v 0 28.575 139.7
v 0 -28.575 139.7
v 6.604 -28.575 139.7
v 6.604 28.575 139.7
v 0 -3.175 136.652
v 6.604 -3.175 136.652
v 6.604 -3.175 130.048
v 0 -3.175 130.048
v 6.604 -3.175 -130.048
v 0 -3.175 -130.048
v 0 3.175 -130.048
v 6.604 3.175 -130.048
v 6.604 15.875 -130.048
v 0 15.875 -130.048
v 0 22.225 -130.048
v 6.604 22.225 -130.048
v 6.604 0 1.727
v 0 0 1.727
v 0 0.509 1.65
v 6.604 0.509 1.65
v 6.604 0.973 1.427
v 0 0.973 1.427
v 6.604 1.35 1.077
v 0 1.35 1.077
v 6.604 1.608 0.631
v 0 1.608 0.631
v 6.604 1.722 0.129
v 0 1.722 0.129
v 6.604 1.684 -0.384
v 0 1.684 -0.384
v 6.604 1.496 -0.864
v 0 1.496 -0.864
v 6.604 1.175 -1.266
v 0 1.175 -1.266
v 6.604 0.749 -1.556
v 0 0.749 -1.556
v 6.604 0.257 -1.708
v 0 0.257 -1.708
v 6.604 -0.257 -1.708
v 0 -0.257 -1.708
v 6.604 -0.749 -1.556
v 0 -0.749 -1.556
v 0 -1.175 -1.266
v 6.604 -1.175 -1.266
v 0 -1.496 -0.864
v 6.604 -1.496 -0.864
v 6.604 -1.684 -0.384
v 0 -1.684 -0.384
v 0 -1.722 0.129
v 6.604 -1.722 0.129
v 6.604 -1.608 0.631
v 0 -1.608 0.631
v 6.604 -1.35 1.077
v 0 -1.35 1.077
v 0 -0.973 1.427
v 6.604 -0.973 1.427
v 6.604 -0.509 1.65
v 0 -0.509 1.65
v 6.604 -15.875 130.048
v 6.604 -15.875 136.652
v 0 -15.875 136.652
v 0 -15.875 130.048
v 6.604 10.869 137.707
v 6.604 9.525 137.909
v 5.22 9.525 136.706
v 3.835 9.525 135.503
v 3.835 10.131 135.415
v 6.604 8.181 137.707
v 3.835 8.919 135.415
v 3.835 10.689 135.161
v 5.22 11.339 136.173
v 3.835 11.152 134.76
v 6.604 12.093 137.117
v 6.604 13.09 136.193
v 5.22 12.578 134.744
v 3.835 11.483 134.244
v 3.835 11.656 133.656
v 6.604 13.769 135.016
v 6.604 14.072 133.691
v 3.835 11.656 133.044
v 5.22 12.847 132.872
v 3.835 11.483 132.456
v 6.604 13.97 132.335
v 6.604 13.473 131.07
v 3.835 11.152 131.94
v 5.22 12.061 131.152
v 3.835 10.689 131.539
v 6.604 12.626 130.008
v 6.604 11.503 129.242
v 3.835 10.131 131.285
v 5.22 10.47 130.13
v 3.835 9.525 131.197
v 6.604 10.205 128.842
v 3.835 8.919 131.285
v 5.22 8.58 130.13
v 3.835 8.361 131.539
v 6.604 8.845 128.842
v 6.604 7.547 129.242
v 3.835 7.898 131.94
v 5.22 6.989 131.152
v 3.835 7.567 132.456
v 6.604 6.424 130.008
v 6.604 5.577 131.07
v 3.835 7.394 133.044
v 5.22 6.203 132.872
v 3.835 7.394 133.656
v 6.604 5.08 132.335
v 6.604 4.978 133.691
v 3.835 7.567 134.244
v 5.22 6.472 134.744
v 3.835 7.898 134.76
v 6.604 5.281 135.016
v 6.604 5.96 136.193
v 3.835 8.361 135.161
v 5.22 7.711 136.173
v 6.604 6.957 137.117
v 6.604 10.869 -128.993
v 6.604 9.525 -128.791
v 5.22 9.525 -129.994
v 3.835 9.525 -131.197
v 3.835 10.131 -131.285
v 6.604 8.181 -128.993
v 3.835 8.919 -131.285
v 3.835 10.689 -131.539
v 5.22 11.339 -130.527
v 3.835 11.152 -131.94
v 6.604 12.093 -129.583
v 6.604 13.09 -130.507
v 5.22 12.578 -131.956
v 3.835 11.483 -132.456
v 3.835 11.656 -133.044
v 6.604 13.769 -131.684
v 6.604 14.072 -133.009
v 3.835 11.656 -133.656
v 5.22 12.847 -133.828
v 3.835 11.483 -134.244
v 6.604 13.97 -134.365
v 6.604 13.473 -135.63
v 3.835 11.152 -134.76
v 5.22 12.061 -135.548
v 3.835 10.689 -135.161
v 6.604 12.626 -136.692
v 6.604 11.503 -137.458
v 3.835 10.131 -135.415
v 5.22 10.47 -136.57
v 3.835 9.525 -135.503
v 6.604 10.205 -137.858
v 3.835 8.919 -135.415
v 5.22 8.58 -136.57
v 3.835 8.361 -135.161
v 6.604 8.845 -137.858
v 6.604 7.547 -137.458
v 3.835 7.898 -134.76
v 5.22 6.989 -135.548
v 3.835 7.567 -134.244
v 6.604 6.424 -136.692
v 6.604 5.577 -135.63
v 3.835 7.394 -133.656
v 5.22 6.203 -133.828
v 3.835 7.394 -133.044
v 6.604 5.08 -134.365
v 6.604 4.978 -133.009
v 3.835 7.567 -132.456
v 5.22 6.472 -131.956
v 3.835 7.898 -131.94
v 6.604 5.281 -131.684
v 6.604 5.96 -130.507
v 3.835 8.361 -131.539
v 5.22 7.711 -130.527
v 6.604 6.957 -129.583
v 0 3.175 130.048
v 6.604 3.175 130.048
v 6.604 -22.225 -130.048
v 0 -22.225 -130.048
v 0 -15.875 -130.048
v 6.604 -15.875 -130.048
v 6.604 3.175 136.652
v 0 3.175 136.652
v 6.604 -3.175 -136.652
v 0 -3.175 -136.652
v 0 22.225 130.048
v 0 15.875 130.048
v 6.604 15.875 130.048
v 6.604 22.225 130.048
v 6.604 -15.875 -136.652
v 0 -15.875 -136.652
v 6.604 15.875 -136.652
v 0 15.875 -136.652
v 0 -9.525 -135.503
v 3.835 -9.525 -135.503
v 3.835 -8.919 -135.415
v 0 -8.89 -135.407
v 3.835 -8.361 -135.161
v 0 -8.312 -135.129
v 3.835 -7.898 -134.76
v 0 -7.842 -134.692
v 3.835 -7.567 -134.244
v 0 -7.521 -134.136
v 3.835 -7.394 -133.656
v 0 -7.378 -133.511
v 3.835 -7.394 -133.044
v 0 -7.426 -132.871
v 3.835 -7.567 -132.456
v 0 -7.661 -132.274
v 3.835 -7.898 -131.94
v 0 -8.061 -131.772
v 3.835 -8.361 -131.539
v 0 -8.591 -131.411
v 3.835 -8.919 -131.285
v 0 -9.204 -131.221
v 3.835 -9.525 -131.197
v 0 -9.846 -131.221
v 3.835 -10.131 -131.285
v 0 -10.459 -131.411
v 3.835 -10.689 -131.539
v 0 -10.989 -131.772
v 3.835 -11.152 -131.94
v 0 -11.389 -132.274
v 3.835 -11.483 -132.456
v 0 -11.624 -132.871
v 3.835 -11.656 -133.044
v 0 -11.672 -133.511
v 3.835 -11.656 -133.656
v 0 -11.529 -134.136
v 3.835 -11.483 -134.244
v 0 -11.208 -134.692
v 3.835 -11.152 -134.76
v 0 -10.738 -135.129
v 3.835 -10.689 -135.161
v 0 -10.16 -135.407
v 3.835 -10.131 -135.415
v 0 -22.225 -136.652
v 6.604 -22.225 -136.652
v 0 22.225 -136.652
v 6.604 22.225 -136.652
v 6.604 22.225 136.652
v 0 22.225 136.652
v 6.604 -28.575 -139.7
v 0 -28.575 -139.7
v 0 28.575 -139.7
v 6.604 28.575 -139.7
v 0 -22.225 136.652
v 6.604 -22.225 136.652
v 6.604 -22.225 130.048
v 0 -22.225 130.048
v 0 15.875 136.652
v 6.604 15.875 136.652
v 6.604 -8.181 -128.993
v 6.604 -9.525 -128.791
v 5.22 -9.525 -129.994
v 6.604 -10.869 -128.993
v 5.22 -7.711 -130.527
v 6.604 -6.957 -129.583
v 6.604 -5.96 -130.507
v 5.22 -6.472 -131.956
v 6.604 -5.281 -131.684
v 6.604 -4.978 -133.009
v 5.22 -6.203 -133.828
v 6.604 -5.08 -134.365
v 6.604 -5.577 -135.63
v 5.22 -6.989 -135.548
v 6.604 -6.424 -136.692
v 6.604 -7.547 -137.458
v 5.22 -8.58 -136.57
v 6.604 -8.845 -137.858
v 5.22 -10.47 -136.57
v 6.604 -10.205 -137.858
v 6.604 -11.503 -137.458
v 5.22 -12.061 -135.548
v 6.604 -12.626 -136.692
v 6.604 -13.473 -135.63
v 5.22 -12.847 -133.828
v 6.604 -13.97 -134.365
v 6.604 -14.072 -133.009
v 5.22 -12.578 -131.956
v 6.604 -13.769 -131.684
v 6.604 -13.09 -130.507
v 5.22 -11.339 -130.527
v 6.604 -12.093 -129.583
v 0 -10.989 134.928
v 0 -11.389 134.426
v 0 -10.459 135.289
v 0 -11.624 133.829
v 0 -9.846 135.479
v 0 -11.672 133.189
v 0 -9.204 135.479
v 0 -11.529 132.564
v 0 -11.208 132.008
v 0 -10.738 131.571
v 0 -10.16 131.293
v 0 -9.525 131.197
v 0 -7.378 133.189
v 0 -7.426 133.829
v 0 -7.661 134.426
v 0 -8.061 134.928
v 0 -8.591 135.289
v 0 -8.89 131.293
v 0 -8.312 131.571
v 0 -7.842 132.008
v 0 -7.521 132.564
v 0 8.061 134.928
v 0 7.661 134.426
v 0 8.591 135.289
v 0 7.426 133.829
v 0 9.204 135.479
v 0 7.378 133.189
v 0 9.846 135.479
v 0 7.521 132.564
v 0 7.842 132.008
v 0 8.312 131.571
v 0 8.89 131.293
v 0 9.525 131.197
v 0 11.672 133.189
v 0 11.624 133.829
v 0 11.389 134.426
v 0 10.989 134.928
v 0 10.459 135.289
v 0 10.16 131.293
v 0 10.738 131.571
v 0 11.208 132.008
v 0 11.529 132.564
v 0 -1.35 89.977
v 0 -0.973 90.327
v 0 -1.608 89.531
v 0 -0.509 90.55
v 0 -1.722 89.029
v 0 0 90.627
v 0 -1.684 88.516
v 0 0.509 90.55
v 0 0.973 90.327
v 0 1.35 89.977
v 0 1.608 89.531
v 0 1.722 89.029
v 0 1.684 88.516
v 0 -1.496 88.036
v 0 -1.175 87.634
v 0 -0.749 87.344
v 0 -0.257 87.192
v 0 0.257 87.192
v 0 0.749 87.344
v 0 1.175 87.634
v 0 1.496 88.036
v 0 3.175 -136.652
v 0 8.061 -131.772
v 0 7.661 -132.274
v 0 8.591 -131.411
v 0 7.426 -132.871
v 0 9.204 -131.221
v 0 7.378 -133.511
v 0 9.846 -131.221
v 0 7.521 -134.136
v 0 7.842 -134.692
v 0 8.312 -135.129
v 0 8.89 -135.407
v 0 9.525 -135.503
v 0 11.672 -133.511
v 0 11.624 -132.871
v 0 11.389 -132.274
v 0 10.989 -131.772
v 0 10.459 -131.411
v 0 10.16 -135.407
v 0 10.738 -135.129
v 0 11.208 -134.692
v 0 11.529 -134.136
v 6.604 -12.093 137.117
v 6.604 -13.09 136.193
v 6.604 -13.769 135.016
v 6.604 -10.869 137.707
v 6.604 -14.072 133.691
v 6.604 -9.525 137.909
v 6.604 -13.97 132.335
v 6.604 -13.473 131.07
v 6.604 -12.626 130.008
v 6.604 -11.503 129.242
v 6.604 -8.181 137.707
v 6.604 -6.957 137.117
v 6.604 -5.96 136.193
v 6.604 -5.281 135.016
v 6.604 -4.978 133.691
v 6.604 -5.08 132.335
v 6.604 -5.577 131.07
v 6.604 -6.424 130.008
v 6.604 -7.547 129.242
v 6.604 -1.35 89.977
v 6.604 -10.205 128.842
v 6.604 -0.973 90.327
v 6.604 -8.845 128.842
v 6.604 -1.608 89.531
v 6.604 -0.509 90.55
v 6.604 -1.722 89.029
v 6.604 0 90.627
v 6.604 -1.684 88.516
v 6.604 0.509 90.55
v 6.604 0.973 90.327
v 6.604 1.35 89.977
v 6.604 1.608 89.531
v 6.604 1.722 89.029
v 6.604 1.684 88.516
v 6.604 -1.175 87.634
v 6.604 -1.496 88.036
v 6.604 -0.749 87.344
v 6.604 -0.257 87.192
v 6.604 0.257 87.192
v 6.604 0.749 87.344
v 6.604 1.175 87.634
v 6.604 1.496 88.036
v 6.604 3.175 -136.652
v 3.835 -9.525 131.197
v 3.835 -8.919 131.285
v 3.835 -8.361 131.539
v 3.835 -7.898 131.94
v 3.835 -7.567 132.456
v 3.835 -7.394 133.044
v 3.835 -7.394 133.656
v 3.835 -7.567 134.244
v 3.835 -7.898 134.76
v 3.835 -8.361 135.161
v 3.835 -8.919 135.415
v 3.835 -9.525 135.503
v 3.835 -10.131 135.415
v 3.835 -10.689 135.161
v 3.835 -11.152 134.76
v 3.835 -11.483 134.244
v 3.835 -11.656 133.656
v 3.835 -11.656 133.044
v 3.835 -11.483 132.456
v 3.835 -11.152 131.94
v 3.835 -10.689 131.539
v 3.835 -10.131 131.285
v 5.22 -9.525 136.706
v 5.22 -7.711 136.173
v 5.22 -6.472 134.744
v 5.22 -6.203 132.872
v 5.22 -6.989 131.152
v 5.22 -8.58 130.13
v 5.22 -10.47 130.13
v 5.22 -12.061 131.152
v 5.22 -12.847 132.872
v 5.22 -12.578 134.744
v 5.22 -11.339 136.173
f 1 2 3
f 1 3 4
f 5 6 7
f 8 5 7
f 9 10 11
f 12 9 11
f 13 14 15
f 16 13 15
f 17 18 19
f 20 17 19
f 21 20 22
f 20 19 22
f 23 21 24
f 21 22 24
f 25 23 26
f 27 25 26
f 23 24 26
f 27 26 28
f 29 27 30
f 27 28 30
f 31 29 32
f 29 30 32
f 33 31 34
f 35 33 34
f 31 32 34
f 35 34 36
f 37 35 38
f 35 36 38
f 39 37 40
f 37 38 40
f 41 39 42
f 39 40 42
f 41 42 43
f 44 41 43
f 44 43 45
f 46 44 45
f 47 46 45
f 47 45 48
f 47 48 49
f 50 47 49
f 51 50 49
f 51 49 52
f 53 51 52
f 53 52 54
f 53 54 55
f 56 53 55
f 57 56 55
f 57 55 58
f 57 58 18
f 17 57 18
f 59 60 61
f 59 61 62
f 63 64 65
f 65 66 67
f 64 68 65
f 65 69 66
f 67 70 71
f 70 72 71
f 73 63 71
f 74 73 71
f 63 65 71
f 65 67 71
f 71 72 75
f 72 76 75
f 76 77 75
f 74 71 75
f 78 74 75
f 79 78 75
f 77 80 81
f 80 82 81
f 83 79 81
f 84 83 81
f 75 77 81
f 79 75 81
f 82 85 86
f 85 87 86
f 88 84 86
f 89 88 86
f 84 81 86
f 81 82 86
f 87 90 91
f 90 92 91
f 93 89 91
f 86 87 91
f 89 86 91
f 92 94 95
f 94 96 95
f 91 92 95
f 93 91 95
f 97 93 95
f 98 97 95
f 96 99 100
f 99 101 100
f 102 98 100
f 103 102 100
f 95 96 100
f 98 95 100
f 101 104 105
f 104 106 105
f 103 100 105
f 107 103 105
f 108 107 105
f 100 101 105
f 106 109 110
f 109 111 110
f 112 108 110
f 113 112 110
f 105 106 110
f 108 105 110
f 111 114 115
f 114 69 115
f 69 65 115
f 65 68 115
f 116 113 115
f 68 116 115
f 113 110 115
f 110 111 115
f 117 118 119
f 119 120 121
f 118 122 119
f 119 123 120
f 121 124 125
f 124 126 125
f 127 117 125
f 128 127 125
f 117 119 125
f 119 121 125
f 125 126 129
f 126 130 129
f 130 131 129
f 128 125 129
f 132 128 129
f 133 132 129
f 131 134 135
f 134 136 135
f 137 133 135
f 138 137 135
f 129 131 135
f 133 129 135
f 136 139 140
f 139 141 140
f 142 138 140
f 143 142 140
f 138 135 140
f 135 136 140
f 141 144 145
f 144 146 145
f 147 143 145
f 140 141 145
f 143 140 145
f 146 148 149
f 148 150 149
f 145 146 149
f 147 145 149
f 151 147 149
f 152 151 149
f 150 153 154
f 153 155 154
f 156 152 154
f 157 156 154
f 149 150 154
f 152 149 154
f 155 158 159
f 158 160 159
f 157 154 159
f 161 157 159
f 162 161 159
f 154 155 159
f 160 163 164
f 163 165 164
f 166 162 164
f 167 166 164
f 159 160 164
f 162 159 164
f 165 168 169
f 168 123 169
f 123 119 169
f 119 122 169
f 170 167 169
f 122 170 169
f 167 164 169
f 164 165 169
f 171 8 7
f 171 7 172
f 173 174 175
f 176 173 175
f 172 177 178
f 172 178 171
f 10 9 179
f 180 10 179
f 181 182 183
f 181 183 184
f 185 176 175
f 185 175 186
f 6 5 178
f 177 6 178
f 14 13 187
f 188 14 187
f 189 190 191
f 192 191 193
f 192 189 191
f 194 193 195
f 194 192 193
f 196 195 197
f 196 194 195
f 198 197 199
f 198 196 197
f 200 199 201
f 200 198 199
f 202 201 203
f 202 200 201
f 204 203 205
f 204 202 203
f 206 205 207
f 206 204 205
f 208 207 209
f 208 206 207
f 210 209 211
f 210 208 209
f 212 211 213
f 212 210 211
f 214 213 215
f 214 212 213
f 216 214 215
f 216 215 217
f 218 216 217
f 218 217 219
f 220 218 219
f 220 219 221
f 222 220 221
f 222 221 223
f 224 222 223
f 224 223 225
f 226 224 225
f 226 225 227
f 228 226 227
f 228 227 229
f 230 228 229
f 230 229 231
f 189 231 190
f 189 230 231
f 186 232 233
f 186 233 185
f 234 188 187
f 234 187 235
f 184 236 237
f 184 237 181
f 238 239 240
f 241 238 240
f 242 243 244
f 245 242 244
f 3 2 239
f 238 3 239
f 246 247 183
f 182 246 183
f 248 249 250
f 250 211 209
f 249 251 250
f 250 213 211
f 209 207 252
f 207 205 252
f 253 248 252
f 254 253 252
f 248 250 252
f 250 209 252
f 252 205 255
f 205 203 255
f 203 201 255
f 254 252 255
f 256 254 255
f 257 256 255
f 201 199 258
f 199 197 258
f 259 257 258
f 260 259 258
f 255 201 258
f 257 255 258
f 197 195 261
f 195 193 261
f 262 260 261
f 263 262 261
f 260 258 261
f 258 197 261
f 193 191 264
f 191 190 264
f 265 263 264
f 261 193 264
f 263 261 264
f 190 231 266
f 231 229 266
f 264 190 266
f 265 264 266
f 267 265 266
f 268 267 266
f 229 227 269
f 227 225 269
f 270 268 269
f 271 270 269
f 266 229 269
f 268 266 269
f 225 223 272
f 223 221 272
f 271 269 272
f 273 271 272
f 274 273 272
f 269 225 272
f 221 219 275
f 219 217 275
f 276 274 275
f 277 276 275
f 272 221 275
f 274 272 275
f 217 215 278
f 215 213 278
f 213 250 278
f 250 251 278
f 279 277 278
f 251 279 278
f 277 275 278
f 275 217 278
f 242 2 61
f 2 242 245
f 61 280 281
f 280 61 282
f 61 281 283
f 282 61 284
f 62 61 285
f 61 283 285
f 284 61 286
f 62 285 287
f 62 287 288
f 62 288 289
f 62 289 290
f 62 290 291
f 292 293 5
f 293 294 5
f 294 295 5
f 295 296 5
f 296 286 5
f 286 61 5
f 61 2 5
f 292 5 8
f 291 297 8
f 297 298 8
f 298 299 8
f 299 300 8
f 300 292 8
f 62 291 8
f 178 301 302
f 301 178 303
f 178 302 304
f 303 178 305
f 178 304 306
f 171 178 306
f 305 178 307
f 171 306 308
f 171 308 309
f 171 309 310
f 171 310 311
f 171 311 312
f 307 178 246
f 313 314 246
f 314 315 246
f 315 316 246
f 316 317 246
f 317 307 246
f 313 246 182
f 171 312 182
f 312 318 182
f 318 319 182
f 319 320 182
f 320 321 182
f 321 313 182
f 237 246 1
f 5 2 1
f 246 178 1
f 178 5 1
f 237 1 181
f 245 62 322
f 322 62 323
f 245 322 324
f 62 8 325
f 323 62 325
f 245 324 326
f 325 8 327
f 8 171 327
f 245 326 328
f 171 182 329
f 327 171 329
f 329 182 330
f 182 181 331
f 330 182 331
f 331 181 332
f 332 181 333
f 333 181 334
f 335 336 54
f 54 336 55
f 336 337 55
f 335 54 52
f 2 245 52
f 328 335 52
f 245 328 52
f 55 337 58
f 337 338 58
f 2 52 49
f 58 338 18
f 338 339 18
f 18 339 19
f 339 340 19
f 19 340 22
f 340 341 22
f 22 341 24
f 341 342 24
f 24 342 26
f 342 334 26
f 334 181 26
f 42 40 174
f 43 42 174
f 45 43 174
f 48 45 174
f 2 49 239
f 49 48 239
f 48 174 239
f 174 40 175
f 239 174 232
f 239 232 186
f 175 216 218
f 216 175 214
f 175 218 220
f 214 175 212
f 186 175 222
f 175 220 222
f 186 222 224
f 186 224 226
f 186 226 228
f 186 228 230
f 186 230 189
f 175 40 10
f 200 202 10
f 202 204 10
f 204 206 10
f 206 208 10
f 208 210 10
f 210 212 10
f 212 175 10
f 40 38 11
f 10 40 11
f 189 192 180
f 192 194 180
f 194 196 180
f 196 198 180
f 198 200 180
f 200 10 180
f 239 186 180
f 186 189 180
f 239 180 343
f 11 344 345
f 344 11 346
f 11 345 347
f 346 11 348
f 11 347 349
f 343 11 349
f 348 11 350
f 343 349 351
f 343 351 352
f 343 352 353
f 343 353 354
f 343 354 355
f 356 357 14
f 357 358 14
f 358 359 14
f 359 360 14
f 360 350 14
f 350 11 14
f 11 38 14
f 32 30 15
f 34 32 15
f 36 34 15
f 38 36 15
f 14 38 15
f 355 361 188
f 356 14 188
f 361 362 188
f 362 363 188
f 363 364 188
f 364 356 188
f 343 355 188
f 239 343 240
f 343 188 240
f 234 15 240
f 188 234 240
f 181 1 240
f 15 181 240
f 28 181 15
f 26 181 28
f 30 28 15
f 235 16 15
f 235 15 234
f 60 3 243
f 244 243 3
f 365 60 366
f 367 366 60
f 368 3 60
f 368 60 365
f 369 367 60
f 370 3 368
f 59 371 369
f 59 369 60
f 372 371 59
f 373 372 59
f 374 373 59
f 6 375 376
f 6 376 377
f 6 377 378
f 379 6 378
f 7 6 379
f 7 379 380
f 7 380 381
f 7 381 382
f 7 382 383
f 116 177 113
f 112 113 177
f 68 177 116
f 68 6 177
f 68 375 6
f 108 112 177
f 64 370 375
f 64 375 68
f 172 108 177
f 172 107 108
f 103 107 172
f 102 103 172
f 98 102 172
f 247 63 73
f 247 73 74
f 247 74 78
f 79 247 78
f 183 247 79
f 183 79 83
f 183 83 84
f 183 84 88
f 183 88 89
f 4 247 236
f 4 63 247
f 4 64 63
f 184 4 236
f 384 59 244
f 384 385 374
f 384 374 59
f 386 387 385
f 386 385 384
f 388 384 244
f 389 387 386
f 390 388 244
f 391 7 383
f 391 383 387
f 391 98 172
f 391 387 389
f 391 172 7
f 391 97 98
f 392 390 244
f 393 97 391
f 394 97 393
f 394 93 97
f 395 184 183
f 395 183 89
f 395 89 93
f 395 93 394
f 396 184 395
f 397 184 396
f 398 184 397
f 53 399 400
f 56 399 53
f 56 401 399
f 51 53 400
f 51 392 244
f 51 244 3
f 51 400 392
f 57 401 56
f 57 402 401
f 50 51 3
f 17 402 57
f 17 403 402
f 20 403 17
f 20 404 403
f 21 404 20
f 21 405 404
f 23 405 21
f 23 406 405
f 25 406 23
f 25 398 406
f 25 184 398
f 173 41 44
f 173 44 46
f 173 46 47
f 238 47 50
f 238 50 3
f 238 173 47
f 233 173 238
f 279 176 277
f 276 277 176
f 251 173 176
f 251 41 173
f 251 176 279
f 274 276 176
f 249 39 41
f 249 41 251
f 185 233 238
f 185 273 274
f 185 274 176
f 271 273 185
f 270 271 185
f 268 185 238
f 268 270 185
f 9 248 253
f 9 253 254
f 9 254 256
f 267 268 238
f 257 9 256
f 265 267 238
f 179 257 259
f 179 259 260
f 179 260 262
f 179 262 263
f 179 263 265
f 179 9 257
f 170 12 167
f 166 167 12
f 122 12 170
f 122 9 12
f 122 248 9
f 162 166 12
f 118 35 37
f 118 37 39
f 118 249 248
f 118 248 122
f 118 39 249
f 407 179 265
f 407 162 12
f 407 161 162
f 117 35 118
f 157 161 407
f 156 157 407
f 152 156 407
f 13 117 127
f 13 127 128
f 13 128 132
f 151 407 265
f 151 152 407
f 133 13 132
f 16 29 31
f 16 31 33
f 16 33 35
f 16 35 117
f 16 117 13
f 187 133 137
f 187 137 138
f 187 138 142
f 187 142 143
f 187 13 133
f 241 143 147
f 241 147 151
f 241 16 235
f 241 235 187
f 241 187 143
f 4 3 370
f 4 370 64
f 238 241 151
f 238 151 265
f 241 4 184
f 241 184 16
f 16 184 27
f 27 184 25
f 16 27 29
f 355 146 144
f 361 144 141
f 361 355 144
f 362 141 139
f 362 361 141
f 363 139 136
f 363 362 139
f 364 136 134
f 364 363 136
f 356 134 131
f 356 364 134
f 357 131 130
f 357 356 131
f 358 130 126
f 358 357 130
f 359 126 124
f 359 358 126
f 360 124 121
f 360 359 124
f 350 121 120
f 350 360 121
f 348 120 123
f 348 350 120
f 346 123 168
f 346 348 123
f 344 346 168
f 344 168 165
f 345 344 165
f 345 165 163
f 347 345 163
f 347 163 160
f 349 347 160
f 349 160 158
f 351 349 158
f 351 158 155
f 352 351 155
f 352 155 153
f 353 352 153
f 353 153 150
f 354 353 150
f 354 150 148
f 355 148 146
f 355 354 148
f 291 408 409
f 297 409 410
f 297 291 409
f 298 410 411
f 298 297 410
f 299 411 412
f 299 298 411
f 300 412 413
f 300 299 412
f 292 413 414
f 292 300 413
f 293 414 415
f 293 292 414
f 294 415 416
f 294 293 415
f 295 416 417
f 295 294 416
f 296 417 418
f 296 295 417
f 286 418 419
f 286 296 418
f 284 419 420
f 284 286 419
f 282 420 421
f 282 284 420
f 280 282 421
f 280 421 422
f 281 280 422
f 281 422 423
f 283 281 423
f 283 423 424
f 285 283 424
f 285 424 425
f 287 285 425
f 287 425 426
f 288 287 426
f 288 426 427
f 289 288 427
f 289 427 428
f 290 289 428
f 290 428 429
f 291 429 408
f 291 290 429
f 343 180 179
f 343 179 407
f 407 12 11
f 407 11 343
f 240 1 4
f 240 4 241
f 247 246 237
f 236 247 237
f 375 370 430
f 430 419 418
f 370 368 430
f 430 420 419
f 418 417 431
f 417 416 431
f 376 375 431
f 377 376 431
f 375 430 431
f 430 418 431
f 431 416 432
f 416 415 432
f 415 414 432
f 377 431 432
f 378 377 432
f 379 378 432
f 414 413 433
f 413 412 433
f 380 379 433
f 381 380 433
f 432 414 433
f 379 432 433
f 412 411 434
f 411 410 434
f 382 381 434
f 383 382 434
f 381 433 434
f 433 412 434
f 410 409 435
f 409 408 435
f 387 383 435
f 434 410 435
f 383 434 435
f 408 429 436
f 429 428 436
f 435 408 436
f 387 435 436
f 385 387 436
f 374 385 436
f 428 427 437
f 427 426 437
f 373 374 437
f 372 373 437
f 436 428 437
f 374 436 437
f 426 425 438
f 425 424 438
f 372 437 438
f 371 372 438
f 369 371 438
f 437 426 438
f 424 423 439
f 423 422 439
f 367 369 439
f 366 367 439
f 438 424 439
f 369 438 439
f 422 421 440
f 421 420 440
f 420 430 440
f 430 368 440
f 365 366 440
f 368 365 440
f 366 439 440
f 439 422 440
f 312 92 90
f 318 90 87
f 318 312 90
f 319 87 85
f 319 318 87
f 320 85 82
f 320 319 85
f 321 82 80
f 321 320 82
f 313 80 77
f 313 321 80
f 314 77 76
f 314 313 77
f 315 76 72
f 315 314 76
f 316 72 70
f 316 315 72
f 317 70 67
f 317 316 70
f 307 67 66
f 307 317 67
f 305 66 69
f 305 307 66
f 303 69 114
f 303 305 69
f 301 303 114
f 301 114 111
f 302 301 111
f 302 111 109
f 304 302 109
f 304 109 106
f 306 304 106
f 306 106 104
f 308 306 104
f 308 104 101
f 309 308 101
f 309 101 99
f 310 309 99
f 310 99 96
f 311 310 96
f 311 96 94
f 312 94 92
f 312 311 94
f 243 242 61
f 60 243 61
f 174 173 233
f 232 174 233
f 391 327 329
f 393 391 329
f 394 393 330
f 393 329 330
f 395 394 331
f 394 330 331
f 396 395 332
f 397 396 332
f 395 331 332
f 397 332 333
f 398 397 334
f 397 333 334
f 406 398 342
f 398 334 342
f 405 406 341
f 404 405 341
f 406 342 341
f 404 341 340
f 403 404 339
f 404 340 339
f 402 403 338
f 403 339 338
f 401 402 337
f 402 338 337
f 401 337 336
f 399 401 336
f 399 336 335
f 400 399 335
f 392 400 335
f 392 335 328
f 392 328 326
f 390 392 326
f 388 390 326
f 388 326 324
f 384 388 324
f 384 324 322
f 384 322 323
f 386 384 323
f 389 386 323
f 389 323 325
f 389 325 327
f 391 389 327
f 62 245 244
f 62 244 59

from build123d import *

# Parameters (mm, degrees)
SKETCH1_W                                         = 279.4
SKETCH1_H                                         = 57.15
SKETCH1_R                                         = 2.15265
SKETCH1_W_2                                       = 6.604
SKETCH1_H_2                                       = 6.35
BOSS_EXTRUDE1_DEPTH                               = 6.604
CSK_FOR_8_FLAT_HEAD_SOCKET_CAP_SCREW1_D           = 4.3053
CSK_FOR_8_FLAT_HEAD_SOCKET_CAP_SCREW1_CSINK_D     = 9.1186
CSK_FOR_8_FLAT_HEAD_SOCKET_CAP_SCREW1_CSINK_ANGLE = 82
F_8_32_TAPPED_HOLE1_D                             = 3.4544
F_8_32_TAPPED_HOLE1_DEPTH                         = 10.7188
F_8_32_TAPPED_HOLE1_TIP                           = 1.037806461


with BuildPart() as part:
    # Sketch1 → Boss-Extrude1 (new body)
    with BuildSketch(Plane(origin=(0, 0, 0), x_dir=(0, 0, -1), z_dir=(1, 0, 0))):
        Rectangle(SKETCH1_W, SKETCH1_H)
        with Locations((-133.35, 9.525)):
            Circle(SKETCH1_R, mode=Mode.SUBTRACT)
        with Locations((-133.35, -9.525)):
            Circle(SKETCH1_R, mode=Mode.SUBTRACT)
        with Locations((133.35, 9.525)):
            Circle(SKETCH1_R, mode=Mode.SUBTRACT)
        with Locations((133.35, -9.525)):
            Circle(SKETCH1_R, mode=Mode.SUBTRACT)
        with Locations((-133.35, 0)):
            Rectangle(SKETCH1_W_2, SKETCH1_H_2, mode=Mode.SUBTRACT)
        with Locations((-133.35, 19.05)):
            Rectangle(SKETCH1_W_2, SKETCH1_H_2, mode=Mode.SUBTRACT)
        with Locations((-133.35, -19.05)):
            Rectangle(SKETCH1_W_2, SKETCH1_H_2, mode=Mode.SUBTRACT)
        with Locations((133.35, 0)):
            Rectangle(SKETCH1_W_2, SKETCH1_H_2, mode=Mode.SUBTRACT)
        with Locations((133.35, 19.05)):
            Rectangle(SKETCH1_W_2, SKETCH1_H_2, mode=Mode.SUBTRACT)
        with Locations((133.35, -19.05)):
            Rectangle(SKETCH1_W_2, SKETCH1_H_2, mode=Mode.SUBTRACT)
    extrude(amount=BOSS_EXTRUDE1_DEPTH)

    # CSK for #8 Flat Head Socket Cap Screw1 (through all)
    with Locations(Plane(origin=(6.604, 0, 0), x_dir=(0, 0, -1), z_dir=(1, 0, 0))):
        with Locations((-133.35, 9.525), (-133.35, -9.525), (133.35, 9.525), (133.35, -9.525)):
            CounterSinkHole(CSK_FOR_8_FLAT_HEAD_SOCKET_CAP_SCREW1_D / 2, CSK_FOR_8_FLAT_HEAD_SOCKET_CAP_SCREW1_CSINK_D / 2, counter_sink_angle=CSK_FOR_8_FLAT_HEAD_SOCKET_CAP_SCREW1_CSINK_ANGLE)

    # #8-32 Tapped Hole1
    with Locations(Plane(origin=(6.604, 0, 0), x_dir=(0, 0, -1), z_dir=(1, 0, 0))):
        with Locations((-88.9, 0), (0, 0)):
            Hole(F_8_32_TAPPED_HOLE1_D / 2, depth=F_8_32_TAPPED_HOLE1_DEPTH)
            with Locations((0, 0, -(F_8_32_TAPPED_HOLE1_DEPTH + F_8_32_TAPPED_HOLE1_TIP / 2))):  # 118° drill point
                Cone(0, F_8_32_TAPPED_HOLE1_D / 2, F_8_32_TAPPED_HOLE1_TIP, mode=Mode.SUBTRACT)


solid = part.part
